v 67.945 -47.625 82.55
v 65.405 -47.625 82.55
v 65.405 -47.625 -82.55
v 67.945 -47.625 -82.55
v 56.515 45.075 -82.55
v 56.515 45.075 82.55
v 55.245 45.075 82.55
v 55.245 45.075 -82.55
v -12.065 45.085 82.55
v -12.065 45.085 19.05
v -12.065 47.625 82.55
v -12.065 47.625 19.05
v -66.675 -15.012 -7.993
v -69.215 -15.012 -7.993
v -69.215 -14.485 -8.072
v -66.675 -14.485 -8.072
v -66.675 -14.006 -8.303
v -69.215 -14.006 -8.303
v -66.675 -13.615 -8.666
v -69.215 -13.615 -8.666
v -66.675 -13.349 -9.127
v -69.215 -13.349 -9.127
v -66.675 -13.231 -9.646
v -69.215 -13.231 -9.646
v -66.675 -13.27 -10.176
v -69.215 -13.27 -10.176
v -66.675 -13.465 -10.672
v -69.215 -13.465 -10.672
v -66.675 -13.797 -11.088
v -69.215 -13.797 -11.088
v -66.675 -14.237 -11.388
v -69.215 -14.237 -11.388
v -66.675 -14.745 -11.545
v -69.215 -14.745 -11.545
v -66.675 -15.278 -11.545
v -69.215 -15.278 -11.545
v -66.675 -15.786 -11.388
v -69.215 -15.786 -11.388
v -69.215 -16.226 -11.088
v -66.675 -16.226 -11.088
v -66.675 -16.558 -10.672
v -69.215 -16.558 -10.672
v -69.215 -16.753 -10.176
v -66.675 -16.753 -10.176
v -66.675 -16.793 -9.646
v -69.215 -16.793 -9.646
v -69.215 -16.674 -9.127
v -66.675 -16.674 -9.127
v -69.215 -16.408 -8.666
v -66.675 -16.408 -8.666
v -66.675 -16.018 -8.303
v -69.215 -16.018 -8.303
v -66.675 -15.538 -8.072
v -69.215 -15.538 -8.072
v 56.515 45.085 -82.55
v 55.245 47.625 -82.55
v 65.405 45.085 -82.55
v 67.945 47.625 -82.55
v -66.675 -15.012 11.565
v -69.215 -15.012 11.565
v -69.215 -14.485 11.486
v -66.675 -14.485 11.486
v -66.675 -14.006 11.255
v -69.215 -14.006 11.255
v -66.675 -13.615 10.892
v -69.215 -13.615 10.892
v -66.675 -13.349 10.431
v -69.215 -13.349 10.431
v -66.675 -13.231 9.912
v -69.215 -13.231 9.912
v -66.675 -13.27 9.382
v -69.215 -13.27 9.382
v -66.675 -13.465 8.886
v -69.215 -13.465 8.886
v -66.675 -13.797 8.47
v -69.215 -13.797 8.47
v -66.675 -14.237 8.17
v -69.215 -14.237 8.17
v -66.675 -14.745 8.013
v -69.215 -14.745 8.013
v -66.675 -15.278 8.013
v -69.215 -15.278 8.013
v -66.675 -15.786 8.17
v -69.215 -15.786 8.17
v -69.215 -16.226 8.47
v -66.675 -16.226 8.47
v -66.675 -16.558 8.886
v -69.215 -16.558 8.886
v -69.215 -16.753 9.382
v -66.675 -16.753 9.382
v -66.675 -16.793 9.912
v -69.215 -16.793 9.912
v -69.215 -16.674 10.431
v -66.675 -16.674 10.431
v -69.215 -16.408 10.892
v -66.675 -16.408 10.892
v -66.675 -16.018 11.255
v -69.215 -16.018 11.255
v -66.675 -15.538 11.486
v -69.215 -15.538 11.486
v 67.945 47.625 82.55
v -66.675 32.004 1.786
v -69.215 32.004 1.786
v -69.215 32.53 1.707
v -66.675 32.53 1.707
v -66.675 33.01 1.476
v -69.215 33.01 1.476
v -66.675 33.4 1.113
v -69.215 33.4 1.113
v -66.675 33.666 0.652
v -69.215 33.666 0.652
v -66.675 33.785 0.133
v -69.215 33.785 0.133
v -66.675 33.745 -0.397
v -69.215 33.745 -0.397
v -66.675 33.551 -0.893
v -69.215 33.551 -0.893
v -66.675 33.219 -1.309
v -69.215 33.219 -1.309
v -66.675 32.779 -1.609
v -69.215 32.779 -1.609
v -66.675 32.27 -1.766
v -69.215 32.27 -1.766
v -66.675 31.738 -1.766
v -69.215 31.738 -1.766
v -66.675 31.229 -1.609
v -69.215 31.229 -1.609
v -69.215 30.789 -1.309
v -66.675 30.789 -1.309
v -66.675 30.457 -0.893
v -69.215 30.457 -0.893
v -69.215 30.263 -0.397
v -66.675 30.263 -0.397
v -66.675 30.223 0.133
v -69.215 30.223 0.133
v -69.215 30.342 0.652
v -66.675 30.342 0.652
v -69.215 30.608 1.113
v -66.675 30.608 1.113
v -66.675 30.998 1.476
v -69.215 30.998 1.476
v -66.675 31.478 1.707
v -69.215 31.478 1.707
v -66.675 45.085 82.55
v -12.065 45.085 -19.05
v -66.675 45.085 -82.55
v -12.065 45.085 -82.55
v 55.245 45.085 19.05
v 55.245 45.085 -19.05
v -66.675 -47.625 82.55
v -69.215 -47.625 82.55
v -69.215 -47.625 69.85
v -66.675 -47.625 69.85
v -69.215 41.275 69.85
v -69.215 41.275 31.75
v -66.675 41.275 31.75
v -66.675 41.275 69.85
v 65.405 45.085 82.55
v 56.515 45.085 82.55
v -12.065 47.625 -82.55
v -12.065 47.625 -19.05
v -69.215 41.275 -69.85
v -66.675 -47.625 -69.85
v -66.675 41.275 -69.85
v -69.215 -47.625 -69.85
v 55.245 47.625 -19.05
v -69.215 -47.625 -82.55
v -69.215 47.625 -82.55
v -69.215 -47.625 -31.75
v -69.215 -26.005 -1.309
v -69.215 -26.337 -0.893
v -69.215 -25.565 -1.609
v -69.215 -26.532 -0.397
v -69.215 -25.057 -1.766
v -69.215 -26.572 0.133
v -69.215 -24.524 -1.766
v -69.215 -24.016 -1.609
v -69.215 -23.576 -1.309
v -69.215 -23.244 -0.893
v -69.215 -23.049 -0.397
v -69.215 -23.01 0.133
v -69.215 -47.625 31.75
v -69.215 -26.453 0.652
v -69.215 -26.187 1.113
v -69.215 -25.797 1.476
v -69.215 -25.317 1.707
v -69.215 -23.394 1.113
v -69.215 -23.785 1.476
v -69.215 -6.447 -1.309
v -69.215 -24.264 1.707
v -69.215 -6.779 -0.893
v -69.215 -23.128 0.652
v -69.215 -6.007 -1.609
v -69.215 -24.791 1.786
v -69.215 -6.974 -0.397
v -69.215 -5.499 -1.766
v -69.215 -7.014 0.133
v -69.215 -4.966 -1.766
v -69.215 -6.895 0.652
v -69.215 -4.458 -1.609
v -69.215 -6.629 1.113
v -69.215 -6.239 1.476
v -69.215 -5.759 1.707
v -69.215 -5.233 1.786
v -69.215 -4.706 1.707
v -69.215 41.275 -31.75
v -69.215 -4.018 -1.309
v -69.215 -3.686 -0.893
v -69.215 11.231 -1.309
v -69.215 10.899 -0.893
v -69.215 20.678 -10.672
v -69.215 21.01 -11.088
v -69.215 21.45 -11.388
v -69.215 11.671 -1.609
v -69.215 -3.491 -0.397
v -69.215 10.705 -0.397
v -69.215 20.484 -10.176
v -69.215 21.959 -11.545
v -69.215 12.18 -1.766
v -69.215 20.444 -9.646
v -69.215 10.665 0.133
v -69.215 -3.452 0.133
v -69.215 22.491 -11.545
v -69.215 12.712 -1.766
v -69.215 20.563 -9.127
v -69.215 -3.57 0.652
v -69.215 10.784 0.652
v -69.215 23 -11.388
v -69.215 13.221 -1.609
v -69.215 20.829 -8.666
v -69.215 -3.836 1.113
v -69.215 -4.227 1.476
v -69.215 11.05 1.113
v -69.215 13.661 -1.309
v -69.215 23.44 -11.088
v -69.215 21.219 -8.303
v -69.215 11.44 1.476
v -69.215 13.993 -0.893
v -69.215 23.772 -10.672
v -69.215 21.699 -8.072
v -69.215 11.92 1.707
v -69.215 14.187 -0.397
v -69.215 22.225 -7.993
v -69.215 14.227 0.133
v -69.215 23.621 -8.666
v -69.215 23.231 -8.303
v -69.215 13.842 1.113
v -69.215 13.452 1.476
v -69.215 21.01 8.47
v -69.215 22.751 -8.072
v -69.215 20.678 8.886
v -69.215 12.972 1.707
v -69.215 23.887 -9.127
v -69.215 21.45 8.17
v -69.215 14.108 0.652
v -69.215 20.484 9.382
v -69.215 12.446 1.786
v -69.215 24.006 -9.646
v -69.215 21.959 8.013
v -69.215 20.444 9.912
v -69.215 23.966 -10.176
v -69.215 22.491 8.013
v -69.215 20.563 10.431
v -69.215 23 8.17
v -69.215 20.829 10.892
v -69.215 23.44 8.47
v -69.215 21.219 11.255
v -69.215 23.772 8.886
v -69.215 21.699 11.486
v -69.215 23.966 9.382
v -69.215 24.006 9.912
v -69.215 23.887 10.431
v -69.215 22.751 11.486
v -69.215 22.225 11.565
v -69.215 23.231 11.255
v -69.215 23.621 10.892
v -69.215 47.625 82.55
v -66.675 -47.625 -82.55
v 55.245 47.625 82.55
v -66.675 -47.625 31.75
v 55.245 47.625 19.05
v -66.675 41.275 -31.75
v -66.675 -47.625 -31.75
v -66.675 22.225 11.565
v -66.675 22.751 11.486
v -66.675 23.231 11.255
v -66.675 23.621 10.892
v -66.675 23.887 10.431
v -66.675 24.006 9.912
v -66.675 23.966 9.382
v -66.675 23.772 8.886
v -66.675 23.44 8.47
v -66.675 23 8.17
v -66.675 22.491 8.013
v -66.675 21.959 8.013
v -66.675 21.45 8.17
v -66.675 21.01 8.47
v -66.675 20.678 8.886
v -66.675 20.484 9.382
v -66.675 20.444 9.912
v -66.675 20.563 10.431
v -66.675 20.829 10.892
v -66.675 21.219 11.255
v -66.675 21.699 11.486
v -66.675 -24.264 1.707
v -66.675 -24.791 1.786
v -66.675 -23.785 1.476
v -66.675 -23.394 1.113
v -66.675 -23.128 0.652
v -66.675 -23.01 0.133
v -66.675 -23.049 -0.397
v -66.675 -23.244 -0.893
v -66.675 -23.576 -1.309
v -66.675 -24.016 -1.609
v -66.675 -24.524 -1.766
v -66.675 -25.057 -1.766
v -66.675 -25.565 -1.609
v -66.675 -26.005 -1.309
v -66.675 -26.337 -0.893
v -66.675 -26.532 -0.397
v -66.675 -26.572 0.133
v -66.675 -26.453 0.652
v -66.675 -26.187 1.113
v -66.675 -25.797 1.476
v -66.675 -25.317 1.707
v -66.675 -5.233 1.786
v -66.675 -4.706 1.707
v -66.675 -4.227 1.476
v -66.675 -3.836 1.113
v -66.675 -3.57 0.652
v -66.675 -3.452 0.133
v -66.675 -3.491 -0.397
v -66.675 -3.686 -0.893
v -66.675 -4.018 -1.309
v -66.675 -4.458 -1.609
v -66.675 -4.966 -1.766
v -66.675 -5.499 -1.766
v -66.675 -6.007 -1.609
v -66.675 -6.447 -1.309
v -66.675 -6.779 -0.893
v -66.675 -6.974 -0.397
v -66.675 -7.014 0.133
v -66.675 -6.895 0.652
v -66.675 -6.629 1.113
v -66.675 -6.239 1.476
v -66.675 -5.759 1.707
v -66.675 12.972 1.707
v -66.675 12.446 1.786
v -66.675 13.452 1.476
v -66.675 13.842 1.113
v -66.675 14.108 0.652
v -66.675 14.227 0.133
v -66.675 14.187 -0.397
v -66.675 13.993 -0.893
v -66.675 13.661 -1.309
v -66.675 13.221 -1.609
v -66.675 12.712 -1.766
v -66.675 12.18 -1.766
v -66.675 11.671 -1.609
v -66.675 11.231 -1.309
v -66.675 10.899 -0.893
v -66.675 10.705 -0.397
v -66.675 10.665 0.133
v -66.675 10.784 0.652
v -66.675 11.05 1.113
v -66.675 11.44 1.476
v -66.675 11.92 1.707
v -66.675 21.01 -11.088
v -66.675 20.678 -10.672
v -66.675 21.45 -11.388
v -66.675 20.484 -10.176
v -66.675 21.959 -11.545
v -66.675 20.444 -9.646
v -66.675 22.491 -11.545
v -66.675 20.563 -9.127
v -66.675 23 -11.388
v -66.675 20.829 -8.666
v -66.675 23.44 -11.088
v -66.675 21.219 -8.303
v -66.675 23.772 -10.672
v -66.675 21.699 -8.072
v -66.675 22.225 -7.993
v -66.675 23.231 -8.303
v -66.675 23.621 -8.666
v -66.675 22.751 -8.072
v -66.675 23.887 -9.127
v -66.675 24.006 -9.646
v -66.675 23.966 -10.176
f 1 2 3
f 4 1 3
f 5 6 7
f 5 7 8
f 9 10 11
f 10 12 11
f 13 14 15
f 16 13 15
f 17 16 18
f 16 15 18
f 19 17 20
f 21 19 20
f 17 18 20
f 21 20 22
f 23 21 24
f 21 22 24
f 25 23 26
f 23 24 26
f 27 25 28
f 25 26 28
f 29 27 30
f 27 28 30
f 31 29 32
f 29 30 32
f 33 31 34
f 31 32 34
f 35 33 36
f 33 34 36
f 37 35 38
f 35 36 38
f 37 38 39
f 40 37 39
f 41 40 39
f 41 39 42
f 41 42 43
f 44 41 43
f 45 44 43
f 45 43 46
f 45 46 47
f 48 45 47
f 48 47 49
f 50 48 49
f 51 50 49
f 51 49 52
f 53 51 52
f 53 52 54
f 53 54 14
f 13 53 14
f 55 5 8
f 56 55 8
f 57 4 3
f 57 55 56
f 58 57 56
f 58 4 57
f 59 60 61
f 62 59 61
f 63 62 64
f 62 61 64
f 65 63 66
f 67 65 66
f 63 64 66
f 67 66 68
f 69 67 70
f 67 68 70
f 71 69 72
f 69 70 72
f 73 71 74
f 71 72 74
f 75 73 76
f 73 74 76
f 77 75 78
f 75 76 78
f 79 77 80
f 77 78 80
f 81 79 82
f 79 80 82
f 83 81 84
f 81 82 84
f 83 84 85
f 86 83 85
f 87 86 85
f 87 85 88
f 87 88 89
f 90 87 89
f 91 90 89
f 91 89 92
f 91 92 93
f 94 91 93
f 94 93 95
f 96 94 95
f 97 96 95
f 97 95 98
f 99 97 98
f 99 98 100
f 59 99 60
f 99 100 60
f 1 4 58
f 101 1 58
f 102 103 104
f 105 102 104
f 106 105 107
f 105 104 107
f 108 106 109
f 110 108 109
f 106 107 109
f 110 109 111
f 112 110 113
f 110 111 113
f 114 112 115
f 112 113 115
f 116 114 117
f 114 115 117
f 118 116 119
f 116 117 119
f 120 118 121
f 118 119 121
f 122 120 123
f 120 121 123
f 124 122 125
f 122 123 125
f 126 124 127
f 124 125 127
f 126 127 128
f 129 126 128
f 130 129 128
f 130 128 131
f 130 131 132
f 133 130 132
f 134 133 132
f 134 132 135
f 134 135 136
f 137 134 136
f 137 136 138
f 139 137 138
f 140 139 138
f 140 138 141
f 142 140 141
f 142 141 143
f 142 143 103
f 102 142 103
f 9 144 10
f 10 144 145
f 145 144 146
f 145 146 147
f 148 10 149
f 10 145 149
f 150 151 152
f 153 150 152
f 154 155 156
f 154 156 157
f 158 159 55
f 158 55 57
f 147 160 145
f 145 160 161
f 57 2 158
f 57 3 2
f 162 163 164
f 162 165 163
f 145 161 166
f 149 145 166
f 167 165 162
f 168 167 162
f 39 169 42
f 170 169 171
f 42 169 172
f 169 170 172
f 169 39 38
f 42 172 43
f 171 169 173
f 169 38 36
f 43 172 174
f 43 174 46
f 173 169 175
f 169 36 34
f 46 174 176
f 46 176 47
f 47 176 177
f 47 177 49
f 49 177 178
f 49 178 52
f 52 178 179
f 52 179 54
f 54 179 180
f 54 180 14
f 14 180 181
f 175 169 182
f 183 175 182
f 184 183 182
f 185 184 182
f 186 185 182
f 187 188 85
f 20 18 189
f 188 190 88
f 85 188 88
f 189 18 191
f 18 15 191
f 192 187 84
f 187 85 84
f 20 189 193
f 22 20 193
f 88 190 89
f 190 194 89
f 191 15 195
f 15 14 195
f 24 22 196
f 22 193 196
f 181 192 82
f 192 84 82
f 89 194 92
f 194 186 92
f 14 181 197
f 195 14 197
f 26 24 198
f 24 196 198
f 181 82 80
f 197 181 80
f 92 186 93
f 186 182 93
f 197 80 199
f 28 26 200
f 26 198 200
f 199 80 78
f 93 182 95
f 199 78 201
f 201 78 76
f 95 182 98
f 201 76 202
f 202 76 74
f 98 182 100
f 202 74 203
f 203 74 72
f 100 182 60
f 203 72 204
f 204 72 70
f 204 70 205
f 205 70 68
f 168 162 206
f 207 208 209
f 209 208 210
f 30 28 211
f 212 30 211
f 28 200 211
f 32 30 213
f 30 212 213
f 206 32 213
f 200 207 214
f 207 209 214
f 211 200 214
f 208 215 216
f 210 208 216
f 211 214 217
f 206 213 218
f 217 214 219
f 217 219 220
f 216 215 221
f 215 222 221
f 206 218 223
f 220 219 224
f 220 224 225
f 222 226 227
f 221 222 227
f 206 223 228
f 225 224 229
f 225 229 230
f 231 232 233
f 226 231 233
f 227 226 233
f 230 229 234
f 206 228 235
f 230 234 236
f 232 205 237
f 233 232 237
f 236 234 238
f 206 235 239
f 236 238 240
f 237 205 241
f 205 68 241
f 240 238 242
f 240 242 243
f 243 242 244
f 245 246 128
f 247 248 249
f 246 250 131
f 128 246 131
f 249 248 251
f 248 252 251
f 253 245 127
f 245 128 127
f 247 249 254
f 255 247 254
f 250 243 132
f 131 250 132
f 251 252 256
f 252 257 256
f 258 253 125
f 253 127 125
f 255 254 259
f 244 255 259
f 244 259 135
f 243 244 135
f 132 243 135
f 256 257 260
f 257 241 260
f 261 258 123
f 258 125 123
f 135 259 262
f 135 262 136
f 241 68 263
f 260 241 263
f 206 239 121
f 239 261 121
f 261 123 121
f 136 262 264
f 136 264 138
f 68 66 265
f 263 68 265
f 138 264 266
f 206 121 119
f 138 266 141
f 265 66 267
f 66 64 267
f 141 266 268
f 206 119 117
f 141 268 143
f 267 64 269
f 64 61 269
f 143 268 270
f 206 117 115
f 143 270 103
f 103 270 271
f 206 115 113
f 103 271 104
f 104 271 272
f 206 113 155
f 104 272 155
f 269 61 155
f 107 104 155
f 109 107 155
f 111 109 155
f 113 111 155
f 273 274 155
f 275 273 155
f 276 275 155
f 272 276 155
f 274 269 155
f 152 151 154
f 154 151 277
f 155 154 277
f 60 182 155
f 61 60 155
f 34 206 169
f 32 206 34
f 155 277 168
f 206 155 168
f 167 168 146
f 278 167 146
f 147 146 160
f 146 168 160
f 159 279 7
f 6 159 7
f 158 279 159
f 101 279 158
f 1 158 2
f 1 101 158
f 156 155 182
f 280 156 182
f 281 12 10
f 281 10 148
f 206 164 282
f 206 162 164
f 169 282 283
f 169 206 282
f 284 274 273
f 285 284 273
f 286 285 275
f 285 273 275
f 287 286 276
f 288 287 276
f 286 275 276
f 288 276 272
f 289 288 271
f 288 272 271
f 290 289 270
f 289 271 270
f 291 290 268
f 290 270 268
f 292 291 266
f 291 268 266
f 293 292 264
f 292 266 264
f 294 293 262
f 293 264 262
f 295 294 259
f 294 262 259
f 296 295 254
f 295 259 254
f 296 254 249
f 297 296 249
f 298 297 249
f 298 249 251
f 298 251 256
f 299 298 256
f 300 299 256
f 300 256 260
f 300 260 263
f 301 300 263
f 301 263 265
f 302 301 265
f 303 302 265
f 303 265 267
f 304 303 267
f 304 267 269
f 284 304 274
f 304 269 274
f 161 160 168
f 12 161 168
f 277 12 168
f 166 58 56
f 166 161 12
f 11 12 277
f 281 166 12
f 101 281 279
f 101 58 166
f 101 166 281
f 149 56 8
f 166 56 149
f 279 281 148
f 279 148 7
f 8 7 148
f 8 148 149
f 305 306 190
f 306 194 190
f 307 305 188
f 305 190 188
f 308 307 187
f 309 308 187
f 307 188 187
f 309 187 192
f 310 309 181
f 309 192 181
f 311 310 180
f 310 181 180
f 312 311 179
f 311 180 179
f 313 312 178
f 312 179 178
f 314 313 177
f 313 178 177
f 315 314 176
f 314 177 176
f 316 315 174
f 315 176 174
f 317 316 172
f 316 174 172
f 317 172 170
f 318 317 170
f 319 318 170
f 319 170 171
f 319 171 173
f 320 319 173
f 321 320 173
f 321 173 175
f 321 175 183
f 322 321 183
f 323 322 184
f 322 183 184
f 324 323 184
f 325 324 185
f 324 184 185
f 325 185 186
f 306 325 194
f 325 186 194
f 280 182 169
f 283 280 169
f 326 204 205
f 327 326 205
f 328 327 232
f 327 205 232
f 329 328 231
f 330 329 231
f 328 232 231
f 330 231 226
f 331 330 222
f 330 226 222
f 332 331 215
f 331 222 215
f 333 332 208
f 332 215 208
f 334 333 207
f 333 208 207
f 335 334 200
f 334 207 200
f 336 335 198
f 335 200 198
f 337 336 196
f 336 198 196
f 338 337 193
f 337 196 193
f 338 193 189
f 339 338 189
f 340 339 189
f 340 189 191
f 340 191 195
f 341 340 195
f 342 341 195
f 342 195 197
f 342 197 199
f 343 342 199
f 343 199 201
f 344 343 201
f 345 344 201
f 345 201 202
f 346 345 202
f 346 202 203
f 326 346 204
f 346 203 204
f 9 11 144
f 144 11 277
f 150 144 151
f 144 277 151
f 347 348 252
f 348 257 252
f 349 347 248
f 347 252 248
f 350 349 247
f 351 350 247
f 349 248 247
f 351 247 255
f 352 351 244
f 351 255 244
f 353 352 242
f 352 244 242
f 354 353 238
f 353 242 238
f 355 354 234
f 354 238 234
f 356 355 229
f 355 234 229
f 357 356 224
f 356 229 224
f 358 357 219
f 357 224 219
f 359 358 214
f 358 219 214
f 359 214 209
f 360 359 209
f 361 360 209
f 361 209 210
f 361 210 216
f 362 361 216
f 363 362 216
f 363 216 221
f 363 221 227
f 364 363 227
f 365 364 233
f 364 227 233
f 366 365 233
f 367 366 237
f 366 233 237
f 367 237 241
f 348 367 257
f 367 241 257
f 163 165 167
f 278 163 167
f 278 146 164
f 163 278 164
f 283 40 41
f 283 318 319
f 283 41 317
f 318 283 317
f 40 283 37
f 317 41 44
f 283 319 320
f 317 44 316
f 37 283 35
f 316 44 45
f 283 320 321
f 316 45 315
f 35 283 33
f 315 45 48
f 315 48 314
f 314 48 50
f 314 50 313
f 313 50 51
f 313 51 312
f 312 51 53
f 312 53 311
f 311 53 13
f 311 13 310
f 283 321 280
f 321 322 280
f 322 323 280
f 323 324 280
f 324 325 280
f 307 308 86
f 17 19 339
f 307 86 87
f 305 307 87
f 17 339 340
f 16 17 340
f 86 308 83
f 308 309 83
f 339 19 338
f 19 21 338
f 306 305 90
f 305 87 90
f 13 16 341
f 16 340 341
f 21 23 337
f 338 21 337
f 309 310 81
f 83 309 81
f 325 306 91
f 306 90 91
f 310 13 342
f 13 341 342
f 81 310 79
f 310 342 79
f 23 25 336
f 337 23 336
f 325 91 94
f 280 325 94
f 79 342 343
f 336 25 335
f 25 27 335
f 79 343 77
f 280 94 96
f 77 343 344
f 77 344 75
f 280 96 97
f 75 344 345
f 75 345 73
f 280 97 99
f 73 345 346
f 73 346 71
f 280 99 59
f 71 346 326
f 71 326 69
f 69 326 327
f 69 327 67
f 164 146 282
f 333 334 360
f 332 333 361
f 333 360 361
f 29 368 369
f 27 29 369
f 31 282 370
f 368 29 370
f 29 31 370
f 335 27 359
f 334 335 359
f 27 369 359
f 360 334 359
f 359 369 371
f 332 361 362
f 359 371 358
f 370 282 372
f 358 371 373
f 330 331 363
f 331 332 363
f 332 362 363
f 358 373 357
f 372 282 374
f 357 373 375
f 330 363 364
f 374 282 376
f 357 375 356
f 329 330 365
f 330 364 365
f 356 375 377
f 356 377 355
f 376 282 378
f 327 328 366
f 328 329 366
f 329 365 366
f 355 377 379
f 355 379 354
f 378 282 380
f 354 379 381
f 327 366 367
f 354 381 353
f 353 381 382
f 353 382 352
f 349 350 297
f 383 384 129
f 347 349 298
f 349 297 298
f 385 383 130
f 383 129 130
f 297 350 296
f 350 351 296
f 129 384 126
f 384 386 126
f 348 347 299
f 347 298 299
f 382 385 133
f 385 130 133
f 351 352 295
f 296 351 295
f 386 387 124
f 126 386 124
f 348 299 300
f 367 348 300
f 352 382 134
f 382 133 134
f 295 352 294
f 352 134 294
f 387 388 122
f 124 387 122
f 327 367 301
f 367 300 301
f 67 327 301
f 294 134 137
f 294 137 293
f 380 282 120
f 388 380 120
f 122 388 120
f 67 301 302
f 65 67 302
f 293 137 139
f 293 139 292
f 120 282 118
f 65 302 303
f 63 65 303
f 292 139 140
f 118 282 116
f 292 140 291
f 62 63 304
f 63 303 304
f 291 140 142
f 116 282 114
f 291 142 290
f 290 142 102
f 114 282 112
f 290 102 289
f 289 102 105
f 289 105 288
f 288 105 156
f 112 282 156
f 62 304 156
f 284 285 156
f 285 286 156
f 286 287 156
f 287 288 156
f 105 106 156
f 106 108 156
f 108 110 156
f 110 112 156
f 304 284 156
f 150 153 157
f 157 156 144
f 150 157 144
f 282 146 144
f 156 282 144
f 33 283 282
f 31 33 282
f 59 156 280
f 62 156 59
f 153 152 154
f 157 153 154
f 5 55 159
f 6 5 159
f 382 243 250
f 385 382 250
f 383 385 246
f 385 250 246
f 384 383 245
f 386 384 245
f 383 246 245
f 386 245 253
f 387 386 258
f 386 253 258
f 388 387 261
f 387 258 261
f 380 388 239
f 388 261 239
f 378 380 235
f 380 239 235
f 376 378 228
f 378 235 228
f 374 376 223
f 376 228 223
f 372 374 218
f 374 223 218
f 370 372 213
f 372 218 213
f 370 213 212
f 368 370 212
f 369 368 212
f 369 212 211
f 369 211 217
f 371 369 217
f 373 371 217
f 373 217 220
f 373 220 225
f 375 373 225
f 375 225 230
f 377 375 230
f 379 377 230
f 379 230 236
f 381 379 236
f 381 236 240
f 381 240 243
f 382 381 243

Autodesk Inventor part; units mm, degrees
ref_plane "YZ Plane" through (0, 0, 0) normal (1, 0, 0) x (0, 1, 0)
ref_plane "XZ Plane" through (0, 0, 0) normal (0, 1, 0) x (-1, 0, 0)
ref_plane "XY Plane" through (0, 0, 0) normal (0, 0, 1) x (1, 0, 0)
sketch "Sketch1" plane through (0, 0, 0) normal (1, 0, 0) x (0, 1, 0)
  line L0 (-47.625, 82.55) -> (-47.625, -82.55)
  line L1 (-47.625, -82.55) -> (47.625, -82.55)
  line L2 (47.625, -82.55) -> (47.625, 82.55)
  line L3 (47.625, 82.55) -> (-47.625, 82.55)
  line L4 (-47.625, 82.55) -> (47.625, -82.55) construction
  line L5 (-47.625, -82.55) -> (47.625, 82.55) construction
  point P0 (0, 0)
  dimension "d0" = 165.1
  dimension "d1" = 95.25
extrude "Extrusion1" add sketch "Sketch1" along normal mid plane 138.43
sketch "Sketch3" plane through (-69.215, 47.625, 82.55) normal (0, 1, 0) x (1, 0, 0)
  line L0 (0, 0) -> (138.43, 0) projected
  line L1 (138.43, 0) -> (138.43, 82.55)
  line L2 (138.43, 165.1) -> (138.43, 0) projected
  line L3 (1.27, 63.5) -> (137.16, 63.5)
  line L4 (137.16, 63.5) -> (137.16, 101.6)
  line L5 (137.16, 101.6) -> (1.27, 101.6)
  line L6 (1.27, 101.6) -> (1.27, 63.5)
  line L7 (1.27, 63.5) -> (137.16, 101.6) construction
  line L8 (137.16, 63.5) -> (1.27, 101.6) construction
  line L9 (2.54, 0) -> (133.35, 0) projected
  line L10 (133.35, 0) -> (133.35, 63.5)
  line L11 (133.35, 0) -> (133.35, 165.1) projected
  line L12 (133.35, 63.5) -> (2.54, 63.5)
  line L13 (2.54, 63.5) -> (2.54, 0)
  line L14 (2.54, 0) -> (133.35, 0)
  line L15 (133.35, 0) -> (133.35, 63.5)
  line L16 (2.54, 165.1) -> (2.54, 0) projected
  line L17 (2.54, 165.1) -> (2.54, 101.6)
  line L18 (2.54, 101.6) -> (133.35, 101.6)
  line L19 (133.35, 101.6) -> (133.35, 165.1)
  line L20 (133.35, 165.1) -> (2.54, 165.1)
  line L21 (2.54, 165.1) -> (2.54, 101.6)
  point P0 (69.215, 82.55)
  point P1 (2.54, 101.6)
  point P2 (133.35, 101.6)
  dimension "d12" = 38.1
  dimension "d13" = 63.5
extrude "Extrusion3" cut sketch "Sketch3" against normal blind 12962.89 contours L13 L3 L10 L0 | L16 L20 L11 L5
sketch "Sketch4" plane through (69.215, 0, 0) normal (1, 0, 0) x (0, 0, -1)
  point P0 (0, 0)
sketch "Sketch5" plane through (-66.675, 47.625, 19.05) normal (0, 0, 1) x (1, 0, 0)
  line L0 (135.89, -95.25) -> (135.89, 0) projected
  line L1 (135.89, -95.25) -> (133.35, -95.25)
  line L2 (135.89, -95.25) -> (130.81, -95.25) projected
  line L3 (130.81, 0) -> (0, 0) projected
  line L4 (0, 0) -> (0, -2.54)
  line L5 (0, 0) -> (0, -95.25) projected
  line L6 (0, -2.54) -> (133.35, -2.54)
  line L7 (133.35, -2.54) -> (133.35, -95.25)
  line L8 (133.35, -95.25) -> (0, -95.25)
  line L9 (0, -95.25) -> (0, -2.54)
  point P0 (66.675, -47.625)
  dimension "d16" = 2.54
  dimension "d17" = 2.54
extrude "Extrusion4" cut sketch "Sketch5" along normal mid plane 203.2
sketch "Sketch7" plane through (-69.215, 47.625, 82.55) normal (0, 1, 0) x (1, 0, 0)
  line L0 (133.35, 63.5) -> (133.35, 0) projected
  line L1 (135.89, 0) -> (138.43, 0) projected
  line L2 (133.35, 63.5) -> (135.89, 63.5)
  line L3 (135.89, 63.5) -> (135.89, 0)
  line L4 (135.89, 0) -> (133.35, 0)
  line L5 (133.35, 0) -> (133.35, 63.5)
  line L6 (133.35, 101.6) -> (2.54, 101.6) projected
  line L7 (135.89, 0) -> (135.89, 165.1) projected
  line L8 (133.35, 101.6) -> (135.89, 101.6)
  line L9 (135.89, 101.6) -> (135.89, 165.1)
  line L10 (135.89, 165.1) -> (133.35, 165.1)
  line L11 (133.35, 165.1) -> (133.35, 101.6)
  point P0 (69.215, 82.55)
extrude "Extrusion5" cut sketch "Sketch7" against normal blind 25.4
sketch "Sketch8" plane through (-69.215, 0, 0) normal (-1, 0, 0) x (0, 0, 1)
  line L0 (-19.05, 45.085) -> (19.05, 45.085) projected
  line L1 (-19.05, 45.085) -> (19.05, 45.085)
  line L2 (-19.05, 45.085) -> (-25.4, 45.085)
  line L3 (-25.4, 45.085) -> (-76.2, 45.085)
  line L4 (-25.4, 45.085) -> (-31.75, 45.085)
  line L5 (-82.55, -47.625) -> (82.55, -47.625) projected
  line L6 (-31.75, 45.085) -> (-31.75, -47.625)
  line L7 (-31.75, -47.625) -> (-69.85, -47.625)
  line L8 (-69.85, -47.625) -> (-69.85, 45.085)
  line L9 (-69.85, 45.085) -> (-31.75, 45.085)
  line L10 (19.05, 45.085) -> (31.75, 45.085)
  line L11 (31.75, 45.085) -> (31.75, -47.625)
  line L12 (31.75, -47.625) -> (69.85, -47.625)
  line L13 (69.85, -47.625) -> (69.85, 45.085)
  line L14 (69.85, 45.085) -> (31.75, 45.085)
  point P0 (0, 0)
  point P1 (-69.85, 45.085)
  dimension "d22" = 6.35
  dimension "d23" = 50.8
  dimension "d24" = 6.35
  dimension "d25" = 38.1
  dimension "d26" = 12.7
  dimension "d27" = 38.1
extrude "Extrusion6" cut sketch "Sketch8" against normal blind 25.4 contours L14 L13 L5 L11 | L6 L5 L8 L3
sketch "Sketch9" plane through (-69.215, 47.625, 82.55) normal (0, 1, 0) x (1, 0, 0)
  line L0 (2.54, 101.6) -> (2.54, 165.1) projected
  line L1 (2.54, 165.1) -> (2.54, 158.75)
  line L2 (2.54, 158.75) -> (135.89, 158.75)
  line L3 (135.89, 158.75) -> (135.89, 165.1)
  line L4 (135.89, 165.1) -> (2.54, 165.1)
  line L5 (2.54, 0) -> (2.54, 63.5) projected
  line L6 (2.54, 0) -> (2.54, 6.35)
  line L7 (2.54, 6.35) -> (135.89, 6.35)
  line L8 (135.89, 6.35) -> (135.89, 0)
  line L9 (135.89, 0) -> (2.54, 0)
  point P0 (69.215, 82.55)
  dimension "d30" = 6.35
  dimension "d31" = 6.35
extrude "Extrusion7" add sketch "Sketch9" against normal blind 2.54
sketch "Sketch10" plane through (-69.215, 0, 0) normal (-1, 0, 0) x (0, 0, 1)
  line L0 (-69.85, 45.085) -> (-69.85, -47.625) projected
  line L1 (-69.85, -47.625) -> (-69.85, 41.275)
  line L2 (-69.85, 41.275) -> (69.85, 41.275)
  line L3 (69.85, -47.625) -> (69.85, 45.085) projected
  line L4 (-69.85, 45.085) -> (-31.75, 45.085) projected
  line L5 (-69.85, 41.275) -> (-69.85, 45.085)
  line L6 (-69.85, 45.085) -> (-31.75, 45.085)
  line L7 (-31.75, 45.085) -> (-31.75, 41.275)
  line L8 (-31.75, 41.275) -> (-69.85, 41.275)
  line L9 (31.75, 45.085) -> (31.75, -47.625) projected
  line L10 (69.85, 45.085) -> (31.75, 45.085) projected
  line L11 (31.75, 41.275) -> (69.85, 41.275)
  line L12 (69.85, 41.275) -> (69.85, 45.085)
  line L13 (69.85, 45.085) -> (31.75, 45.085)
  line L14 (31.75, 45.085) -> (31.75, 41.275)
  point P0 (0, 0)
  dimension "d34" = 88.9
extrude "Extrusion8" add sketch "Sketch10" against normal blind 2.54
sketch "Sketch11" plane through (-69.215, 47.625, 82.55) normal (0, 1, 0) x (1, 0, 0)
  line L0 (0, 165.1) -> (0, 152.4) projected
  line L1 (135.89, 101.6) -> (2.54, 101.6) projected
  line L2 (0, 158.75) -> (12.7, 158.75)
  line L3 (12.7, 158.75) -> (12.7, 101.6)
  line L4 (12.7, 101.6) -> (0, 101.6)
  line L5 (0, 101.6) -> (0, 158.75)
  line L6 (2.54, 63.5) -> (135.89, 63.5) projected
  line L7 (0, 6.35) -> (12.7, 6.35)
  line L8 (12.7, 6.35) -> (12.7, 63.5)
  line L9 (12.7, 63.5) -> (0, 63.5)
  line L10 (0, 63.5) -> (0, 6.35)
  line L11 (138.6414, 6.35) -> (125.9414, 6.35)
  line L12 (125.9414, 6.35) -> (125.9414, 63.5)
  line L13 (125.9414, 63.5) -> (138.6414, 63.5)
  line L14 (138.6414, 63.5) -> (138.6414, 6.35)
  line L15 (125.9414, 101.6) -> (138.6414, 101.6)
  line L16 (138.6414, 101.6) -> (138.6414, 158.75)
  line L17 (138.6414, 158.75) -> (125.9414, 158.75)
  line L18 (125.9414, 158.75) -> (125.9414, 101.6)
  point P0 (69.215, 82.55)
  dimension "d37" = 12.7
  dimension "d38" = 12.7
  dimension "d39" = 12.7
extrude "Extrusion9" add sketch "Sketch11" against normal blind 2.54
sketch "Sketch12" plane through (-69.215, 47.625, -82.55) normal (0, 1, 0) x (1, 0, 0)
  line L0 (138.43, 0) -> (138.43, -6.35) projected
  line L1 (138.43, -6.35) -> (125.73, -6.35)
  line L2 (125.9414, -6.35) -> (12.7, -6.35) projected
  line L3 (138.43, -158.75) -> (138.43, -165.1) projected
  line L4 (138.43, -6.35) -> (138.43, -165.1)
  line L5 (138.43, -165.1) -> (125.73, -165.1)
  line L6 (125.73, -165.1) -> (125.73, -6.35)
  line L7 (125.73, -6.35) -> (138.43, -6.35)
  point P0 (69.215, -82.55)
  dimension "d42" = 12.7
  dimension "d43" = 12.7
extrude "Extrusion10" add sketch "Sketch12" against normal blind 2.54
sketch "Sketch13" plane through (-69.215, 47.625, -82.55) normal (0, 1, 0) x (1, 0, 0)
  line L0 (125.73, -63.5) -> (125.73, -6.35) projected
  line L1 (12.7, -6.35) -> (125.73, -6.35) projected
  line L2 (125.73, -6.35) -> (12.7, -6.35)
  line L3 (12.7, -6.35) -> (12.7, 0)
  line L4 (12.7, 0) -> (125.73, 0)
  line L5 (125.73, 0) -> (125.73, -6.35)
  line L6 (125.73, -158.75) -> (125.73, -101.6) projected
  line L7 (12.7, -101.6) -> (12.7, -158.75) projected
  line L8 (125.73, -158.75) -> (12.7, -158.75)
  line L9 (12.7, -158.75) -> (12.7, -165.1)
  line L10 (12.7, -165.1) -> (125.73, -165.1)
  line L11 (125.73, -165.1) -> (125.73, -158.75)
  point P0 (69.215, -82.55)
extrude "Extrusion11" cut sketch "Sketch13" against normal blind 2.54
sketch "Sketch14" plane through (-69.215, 0, 0) normal (-1, 0, 0) x (0, 0, 1)
  circle A0 centre (0, -5.2326) radius 1.7859
  circle A1 centre (9.779, -15.0116) radius 1.7859
  circle A2 centre (-9.779, -15.0116) radius 1.7859
  circle A3 centre (0, -24.7906) radius 1.7859
  line L0 (82.55, 47.625) -> (-82.55, 47.625) projected
  circle A4 centre (0, 12.446) radius 1.7859
  circle A5 centre (9.779, 22.225) radius 1.7859
  circle A6 centre (-9.779, 22.225) radius 1.7859
  circle A7 centre (0, 32.004) radius 1.7859
  point P0 (0, 0)
  dimension "d49" = 3.5719
  dimension "d50" = 3.5719
  dimension "d51" = 3.5719
  dimension "d52" = 3.5719
  dimension "d71" = 3.5719
  dimension "d72" = 3.5719
  dimension "d73" = 3.5719
  dimension "d74" = 3.5719
extrude "Extrusion12" cut sketch "Sketch14" against normal blind 2.54
sketch "Sketch15" plane through (-69.215, 47.625, 82.55) normal (0, 1, 0) x (1, 0, 0)
  line L0 (138.43, 158.75) -> (138.6414, 158.75) projected
  line L1 (138.43, 158.75) -> (138.6414, 158.75)
  line L2 (138.6414, 158.75) -> (138.6414, -0.8057)
  line L3 (138.6414, -0.8057) -> (138.43, -0.8057)
  line L4 (138.43, -0.8057) -> (138.43, 158.75)
  point P0 (69.215, 82.55)
extrude "Extrusion13" cut sketch "Sketch15" against normal blind 152.4
sketch "Sketch16" plane through (69.215, 47.625, 82.55) normal (0, 1, 0) x (1, 0, 0)
  line L0 (-125.73, 101.6) -> (-125.73, 165.1) projected
  line L1 (-125.73, 165.1) -> (-81.28, 165.1)
  line L2 (-81.28, 165.1) -> (-81.28, 0)
  line L3 (-81.28, 0) -> (-125.73, 0)
  line L4 (-125.73, 0) -> (-125.73, 165.1)
  point P0 (-69.215, 82.55)
  dimension "d57" = 44.45
extrude "Extrusion14" add sketch "Sketch16" against normal blind 2.54
sketch "Sketch17" plane through (69.215, -47.625, -82.55) normal (0, 0, -1) x (-1, 0, 0)
  line L0 (2.54, 0) -> (0, 0) projected
  line L1 (0, 0) -> (1.27, 0)
  line L2 (1.27, 0) -> (3.81, 0)
  line L3 (3.81, 0) -> (3.81, 95.25)
  line L4 (3.81, 95.25) -> (1.27, 95.25)
  line L5 (1.27, 95.25) -> (1.27, 0)
  point P0 (69.215, 47.625)
  dimension "d60" = 1.27
  dimension "d61" = 2.54
extrude "Extrusion15" add sketch "Sketch17" against normal blind 165.1
sketch "Sketch18" plane through (69.215, -47.625, -82.55) normal (0, 0, -1) x (-1, 0, 0)
  line L0 (0, 0) -> (3.81, 0) projected
  line L1 (0, 0) -> (1.27, 0)
  line L2 (1.27, 0) -> (1.27, 95.25)
  line L3 (1.27, 95.25) -> (0, 95.25)
  line L4 (0, 95.25) -> (0, 0)
  point P0 (69.215, 47.625)
  dimension "d64" = 1.27
extrude "Extrusion16" cut sketch "Sketch18" against normal blind 165.1
sketch "Sketch19" plane through (56.515, 47.625, -82.55) normal (-1, 0, 0) x (0, 0, 1)
  line L0 (0, -2.54) -> (0, 0) projected
  line L1 (101.6, 0) -> (165.1, 0) projected
  line L2 (0, 0) -> (165.1, 0)
  line L3 (165.1, 0) -> (165.1, -2.5502)
  line L4 (165.1, -2.5502) -> (0, -2.5502)
  line L5 (0, -2.5502) -> (0, 0)
  point P0 (82.55, -47.625)
extrude "Extrusion17" add sketch "Sketch19" along normal blind 1.27
equation "\"d49\" = d51"
properties part number "intakeCover"
